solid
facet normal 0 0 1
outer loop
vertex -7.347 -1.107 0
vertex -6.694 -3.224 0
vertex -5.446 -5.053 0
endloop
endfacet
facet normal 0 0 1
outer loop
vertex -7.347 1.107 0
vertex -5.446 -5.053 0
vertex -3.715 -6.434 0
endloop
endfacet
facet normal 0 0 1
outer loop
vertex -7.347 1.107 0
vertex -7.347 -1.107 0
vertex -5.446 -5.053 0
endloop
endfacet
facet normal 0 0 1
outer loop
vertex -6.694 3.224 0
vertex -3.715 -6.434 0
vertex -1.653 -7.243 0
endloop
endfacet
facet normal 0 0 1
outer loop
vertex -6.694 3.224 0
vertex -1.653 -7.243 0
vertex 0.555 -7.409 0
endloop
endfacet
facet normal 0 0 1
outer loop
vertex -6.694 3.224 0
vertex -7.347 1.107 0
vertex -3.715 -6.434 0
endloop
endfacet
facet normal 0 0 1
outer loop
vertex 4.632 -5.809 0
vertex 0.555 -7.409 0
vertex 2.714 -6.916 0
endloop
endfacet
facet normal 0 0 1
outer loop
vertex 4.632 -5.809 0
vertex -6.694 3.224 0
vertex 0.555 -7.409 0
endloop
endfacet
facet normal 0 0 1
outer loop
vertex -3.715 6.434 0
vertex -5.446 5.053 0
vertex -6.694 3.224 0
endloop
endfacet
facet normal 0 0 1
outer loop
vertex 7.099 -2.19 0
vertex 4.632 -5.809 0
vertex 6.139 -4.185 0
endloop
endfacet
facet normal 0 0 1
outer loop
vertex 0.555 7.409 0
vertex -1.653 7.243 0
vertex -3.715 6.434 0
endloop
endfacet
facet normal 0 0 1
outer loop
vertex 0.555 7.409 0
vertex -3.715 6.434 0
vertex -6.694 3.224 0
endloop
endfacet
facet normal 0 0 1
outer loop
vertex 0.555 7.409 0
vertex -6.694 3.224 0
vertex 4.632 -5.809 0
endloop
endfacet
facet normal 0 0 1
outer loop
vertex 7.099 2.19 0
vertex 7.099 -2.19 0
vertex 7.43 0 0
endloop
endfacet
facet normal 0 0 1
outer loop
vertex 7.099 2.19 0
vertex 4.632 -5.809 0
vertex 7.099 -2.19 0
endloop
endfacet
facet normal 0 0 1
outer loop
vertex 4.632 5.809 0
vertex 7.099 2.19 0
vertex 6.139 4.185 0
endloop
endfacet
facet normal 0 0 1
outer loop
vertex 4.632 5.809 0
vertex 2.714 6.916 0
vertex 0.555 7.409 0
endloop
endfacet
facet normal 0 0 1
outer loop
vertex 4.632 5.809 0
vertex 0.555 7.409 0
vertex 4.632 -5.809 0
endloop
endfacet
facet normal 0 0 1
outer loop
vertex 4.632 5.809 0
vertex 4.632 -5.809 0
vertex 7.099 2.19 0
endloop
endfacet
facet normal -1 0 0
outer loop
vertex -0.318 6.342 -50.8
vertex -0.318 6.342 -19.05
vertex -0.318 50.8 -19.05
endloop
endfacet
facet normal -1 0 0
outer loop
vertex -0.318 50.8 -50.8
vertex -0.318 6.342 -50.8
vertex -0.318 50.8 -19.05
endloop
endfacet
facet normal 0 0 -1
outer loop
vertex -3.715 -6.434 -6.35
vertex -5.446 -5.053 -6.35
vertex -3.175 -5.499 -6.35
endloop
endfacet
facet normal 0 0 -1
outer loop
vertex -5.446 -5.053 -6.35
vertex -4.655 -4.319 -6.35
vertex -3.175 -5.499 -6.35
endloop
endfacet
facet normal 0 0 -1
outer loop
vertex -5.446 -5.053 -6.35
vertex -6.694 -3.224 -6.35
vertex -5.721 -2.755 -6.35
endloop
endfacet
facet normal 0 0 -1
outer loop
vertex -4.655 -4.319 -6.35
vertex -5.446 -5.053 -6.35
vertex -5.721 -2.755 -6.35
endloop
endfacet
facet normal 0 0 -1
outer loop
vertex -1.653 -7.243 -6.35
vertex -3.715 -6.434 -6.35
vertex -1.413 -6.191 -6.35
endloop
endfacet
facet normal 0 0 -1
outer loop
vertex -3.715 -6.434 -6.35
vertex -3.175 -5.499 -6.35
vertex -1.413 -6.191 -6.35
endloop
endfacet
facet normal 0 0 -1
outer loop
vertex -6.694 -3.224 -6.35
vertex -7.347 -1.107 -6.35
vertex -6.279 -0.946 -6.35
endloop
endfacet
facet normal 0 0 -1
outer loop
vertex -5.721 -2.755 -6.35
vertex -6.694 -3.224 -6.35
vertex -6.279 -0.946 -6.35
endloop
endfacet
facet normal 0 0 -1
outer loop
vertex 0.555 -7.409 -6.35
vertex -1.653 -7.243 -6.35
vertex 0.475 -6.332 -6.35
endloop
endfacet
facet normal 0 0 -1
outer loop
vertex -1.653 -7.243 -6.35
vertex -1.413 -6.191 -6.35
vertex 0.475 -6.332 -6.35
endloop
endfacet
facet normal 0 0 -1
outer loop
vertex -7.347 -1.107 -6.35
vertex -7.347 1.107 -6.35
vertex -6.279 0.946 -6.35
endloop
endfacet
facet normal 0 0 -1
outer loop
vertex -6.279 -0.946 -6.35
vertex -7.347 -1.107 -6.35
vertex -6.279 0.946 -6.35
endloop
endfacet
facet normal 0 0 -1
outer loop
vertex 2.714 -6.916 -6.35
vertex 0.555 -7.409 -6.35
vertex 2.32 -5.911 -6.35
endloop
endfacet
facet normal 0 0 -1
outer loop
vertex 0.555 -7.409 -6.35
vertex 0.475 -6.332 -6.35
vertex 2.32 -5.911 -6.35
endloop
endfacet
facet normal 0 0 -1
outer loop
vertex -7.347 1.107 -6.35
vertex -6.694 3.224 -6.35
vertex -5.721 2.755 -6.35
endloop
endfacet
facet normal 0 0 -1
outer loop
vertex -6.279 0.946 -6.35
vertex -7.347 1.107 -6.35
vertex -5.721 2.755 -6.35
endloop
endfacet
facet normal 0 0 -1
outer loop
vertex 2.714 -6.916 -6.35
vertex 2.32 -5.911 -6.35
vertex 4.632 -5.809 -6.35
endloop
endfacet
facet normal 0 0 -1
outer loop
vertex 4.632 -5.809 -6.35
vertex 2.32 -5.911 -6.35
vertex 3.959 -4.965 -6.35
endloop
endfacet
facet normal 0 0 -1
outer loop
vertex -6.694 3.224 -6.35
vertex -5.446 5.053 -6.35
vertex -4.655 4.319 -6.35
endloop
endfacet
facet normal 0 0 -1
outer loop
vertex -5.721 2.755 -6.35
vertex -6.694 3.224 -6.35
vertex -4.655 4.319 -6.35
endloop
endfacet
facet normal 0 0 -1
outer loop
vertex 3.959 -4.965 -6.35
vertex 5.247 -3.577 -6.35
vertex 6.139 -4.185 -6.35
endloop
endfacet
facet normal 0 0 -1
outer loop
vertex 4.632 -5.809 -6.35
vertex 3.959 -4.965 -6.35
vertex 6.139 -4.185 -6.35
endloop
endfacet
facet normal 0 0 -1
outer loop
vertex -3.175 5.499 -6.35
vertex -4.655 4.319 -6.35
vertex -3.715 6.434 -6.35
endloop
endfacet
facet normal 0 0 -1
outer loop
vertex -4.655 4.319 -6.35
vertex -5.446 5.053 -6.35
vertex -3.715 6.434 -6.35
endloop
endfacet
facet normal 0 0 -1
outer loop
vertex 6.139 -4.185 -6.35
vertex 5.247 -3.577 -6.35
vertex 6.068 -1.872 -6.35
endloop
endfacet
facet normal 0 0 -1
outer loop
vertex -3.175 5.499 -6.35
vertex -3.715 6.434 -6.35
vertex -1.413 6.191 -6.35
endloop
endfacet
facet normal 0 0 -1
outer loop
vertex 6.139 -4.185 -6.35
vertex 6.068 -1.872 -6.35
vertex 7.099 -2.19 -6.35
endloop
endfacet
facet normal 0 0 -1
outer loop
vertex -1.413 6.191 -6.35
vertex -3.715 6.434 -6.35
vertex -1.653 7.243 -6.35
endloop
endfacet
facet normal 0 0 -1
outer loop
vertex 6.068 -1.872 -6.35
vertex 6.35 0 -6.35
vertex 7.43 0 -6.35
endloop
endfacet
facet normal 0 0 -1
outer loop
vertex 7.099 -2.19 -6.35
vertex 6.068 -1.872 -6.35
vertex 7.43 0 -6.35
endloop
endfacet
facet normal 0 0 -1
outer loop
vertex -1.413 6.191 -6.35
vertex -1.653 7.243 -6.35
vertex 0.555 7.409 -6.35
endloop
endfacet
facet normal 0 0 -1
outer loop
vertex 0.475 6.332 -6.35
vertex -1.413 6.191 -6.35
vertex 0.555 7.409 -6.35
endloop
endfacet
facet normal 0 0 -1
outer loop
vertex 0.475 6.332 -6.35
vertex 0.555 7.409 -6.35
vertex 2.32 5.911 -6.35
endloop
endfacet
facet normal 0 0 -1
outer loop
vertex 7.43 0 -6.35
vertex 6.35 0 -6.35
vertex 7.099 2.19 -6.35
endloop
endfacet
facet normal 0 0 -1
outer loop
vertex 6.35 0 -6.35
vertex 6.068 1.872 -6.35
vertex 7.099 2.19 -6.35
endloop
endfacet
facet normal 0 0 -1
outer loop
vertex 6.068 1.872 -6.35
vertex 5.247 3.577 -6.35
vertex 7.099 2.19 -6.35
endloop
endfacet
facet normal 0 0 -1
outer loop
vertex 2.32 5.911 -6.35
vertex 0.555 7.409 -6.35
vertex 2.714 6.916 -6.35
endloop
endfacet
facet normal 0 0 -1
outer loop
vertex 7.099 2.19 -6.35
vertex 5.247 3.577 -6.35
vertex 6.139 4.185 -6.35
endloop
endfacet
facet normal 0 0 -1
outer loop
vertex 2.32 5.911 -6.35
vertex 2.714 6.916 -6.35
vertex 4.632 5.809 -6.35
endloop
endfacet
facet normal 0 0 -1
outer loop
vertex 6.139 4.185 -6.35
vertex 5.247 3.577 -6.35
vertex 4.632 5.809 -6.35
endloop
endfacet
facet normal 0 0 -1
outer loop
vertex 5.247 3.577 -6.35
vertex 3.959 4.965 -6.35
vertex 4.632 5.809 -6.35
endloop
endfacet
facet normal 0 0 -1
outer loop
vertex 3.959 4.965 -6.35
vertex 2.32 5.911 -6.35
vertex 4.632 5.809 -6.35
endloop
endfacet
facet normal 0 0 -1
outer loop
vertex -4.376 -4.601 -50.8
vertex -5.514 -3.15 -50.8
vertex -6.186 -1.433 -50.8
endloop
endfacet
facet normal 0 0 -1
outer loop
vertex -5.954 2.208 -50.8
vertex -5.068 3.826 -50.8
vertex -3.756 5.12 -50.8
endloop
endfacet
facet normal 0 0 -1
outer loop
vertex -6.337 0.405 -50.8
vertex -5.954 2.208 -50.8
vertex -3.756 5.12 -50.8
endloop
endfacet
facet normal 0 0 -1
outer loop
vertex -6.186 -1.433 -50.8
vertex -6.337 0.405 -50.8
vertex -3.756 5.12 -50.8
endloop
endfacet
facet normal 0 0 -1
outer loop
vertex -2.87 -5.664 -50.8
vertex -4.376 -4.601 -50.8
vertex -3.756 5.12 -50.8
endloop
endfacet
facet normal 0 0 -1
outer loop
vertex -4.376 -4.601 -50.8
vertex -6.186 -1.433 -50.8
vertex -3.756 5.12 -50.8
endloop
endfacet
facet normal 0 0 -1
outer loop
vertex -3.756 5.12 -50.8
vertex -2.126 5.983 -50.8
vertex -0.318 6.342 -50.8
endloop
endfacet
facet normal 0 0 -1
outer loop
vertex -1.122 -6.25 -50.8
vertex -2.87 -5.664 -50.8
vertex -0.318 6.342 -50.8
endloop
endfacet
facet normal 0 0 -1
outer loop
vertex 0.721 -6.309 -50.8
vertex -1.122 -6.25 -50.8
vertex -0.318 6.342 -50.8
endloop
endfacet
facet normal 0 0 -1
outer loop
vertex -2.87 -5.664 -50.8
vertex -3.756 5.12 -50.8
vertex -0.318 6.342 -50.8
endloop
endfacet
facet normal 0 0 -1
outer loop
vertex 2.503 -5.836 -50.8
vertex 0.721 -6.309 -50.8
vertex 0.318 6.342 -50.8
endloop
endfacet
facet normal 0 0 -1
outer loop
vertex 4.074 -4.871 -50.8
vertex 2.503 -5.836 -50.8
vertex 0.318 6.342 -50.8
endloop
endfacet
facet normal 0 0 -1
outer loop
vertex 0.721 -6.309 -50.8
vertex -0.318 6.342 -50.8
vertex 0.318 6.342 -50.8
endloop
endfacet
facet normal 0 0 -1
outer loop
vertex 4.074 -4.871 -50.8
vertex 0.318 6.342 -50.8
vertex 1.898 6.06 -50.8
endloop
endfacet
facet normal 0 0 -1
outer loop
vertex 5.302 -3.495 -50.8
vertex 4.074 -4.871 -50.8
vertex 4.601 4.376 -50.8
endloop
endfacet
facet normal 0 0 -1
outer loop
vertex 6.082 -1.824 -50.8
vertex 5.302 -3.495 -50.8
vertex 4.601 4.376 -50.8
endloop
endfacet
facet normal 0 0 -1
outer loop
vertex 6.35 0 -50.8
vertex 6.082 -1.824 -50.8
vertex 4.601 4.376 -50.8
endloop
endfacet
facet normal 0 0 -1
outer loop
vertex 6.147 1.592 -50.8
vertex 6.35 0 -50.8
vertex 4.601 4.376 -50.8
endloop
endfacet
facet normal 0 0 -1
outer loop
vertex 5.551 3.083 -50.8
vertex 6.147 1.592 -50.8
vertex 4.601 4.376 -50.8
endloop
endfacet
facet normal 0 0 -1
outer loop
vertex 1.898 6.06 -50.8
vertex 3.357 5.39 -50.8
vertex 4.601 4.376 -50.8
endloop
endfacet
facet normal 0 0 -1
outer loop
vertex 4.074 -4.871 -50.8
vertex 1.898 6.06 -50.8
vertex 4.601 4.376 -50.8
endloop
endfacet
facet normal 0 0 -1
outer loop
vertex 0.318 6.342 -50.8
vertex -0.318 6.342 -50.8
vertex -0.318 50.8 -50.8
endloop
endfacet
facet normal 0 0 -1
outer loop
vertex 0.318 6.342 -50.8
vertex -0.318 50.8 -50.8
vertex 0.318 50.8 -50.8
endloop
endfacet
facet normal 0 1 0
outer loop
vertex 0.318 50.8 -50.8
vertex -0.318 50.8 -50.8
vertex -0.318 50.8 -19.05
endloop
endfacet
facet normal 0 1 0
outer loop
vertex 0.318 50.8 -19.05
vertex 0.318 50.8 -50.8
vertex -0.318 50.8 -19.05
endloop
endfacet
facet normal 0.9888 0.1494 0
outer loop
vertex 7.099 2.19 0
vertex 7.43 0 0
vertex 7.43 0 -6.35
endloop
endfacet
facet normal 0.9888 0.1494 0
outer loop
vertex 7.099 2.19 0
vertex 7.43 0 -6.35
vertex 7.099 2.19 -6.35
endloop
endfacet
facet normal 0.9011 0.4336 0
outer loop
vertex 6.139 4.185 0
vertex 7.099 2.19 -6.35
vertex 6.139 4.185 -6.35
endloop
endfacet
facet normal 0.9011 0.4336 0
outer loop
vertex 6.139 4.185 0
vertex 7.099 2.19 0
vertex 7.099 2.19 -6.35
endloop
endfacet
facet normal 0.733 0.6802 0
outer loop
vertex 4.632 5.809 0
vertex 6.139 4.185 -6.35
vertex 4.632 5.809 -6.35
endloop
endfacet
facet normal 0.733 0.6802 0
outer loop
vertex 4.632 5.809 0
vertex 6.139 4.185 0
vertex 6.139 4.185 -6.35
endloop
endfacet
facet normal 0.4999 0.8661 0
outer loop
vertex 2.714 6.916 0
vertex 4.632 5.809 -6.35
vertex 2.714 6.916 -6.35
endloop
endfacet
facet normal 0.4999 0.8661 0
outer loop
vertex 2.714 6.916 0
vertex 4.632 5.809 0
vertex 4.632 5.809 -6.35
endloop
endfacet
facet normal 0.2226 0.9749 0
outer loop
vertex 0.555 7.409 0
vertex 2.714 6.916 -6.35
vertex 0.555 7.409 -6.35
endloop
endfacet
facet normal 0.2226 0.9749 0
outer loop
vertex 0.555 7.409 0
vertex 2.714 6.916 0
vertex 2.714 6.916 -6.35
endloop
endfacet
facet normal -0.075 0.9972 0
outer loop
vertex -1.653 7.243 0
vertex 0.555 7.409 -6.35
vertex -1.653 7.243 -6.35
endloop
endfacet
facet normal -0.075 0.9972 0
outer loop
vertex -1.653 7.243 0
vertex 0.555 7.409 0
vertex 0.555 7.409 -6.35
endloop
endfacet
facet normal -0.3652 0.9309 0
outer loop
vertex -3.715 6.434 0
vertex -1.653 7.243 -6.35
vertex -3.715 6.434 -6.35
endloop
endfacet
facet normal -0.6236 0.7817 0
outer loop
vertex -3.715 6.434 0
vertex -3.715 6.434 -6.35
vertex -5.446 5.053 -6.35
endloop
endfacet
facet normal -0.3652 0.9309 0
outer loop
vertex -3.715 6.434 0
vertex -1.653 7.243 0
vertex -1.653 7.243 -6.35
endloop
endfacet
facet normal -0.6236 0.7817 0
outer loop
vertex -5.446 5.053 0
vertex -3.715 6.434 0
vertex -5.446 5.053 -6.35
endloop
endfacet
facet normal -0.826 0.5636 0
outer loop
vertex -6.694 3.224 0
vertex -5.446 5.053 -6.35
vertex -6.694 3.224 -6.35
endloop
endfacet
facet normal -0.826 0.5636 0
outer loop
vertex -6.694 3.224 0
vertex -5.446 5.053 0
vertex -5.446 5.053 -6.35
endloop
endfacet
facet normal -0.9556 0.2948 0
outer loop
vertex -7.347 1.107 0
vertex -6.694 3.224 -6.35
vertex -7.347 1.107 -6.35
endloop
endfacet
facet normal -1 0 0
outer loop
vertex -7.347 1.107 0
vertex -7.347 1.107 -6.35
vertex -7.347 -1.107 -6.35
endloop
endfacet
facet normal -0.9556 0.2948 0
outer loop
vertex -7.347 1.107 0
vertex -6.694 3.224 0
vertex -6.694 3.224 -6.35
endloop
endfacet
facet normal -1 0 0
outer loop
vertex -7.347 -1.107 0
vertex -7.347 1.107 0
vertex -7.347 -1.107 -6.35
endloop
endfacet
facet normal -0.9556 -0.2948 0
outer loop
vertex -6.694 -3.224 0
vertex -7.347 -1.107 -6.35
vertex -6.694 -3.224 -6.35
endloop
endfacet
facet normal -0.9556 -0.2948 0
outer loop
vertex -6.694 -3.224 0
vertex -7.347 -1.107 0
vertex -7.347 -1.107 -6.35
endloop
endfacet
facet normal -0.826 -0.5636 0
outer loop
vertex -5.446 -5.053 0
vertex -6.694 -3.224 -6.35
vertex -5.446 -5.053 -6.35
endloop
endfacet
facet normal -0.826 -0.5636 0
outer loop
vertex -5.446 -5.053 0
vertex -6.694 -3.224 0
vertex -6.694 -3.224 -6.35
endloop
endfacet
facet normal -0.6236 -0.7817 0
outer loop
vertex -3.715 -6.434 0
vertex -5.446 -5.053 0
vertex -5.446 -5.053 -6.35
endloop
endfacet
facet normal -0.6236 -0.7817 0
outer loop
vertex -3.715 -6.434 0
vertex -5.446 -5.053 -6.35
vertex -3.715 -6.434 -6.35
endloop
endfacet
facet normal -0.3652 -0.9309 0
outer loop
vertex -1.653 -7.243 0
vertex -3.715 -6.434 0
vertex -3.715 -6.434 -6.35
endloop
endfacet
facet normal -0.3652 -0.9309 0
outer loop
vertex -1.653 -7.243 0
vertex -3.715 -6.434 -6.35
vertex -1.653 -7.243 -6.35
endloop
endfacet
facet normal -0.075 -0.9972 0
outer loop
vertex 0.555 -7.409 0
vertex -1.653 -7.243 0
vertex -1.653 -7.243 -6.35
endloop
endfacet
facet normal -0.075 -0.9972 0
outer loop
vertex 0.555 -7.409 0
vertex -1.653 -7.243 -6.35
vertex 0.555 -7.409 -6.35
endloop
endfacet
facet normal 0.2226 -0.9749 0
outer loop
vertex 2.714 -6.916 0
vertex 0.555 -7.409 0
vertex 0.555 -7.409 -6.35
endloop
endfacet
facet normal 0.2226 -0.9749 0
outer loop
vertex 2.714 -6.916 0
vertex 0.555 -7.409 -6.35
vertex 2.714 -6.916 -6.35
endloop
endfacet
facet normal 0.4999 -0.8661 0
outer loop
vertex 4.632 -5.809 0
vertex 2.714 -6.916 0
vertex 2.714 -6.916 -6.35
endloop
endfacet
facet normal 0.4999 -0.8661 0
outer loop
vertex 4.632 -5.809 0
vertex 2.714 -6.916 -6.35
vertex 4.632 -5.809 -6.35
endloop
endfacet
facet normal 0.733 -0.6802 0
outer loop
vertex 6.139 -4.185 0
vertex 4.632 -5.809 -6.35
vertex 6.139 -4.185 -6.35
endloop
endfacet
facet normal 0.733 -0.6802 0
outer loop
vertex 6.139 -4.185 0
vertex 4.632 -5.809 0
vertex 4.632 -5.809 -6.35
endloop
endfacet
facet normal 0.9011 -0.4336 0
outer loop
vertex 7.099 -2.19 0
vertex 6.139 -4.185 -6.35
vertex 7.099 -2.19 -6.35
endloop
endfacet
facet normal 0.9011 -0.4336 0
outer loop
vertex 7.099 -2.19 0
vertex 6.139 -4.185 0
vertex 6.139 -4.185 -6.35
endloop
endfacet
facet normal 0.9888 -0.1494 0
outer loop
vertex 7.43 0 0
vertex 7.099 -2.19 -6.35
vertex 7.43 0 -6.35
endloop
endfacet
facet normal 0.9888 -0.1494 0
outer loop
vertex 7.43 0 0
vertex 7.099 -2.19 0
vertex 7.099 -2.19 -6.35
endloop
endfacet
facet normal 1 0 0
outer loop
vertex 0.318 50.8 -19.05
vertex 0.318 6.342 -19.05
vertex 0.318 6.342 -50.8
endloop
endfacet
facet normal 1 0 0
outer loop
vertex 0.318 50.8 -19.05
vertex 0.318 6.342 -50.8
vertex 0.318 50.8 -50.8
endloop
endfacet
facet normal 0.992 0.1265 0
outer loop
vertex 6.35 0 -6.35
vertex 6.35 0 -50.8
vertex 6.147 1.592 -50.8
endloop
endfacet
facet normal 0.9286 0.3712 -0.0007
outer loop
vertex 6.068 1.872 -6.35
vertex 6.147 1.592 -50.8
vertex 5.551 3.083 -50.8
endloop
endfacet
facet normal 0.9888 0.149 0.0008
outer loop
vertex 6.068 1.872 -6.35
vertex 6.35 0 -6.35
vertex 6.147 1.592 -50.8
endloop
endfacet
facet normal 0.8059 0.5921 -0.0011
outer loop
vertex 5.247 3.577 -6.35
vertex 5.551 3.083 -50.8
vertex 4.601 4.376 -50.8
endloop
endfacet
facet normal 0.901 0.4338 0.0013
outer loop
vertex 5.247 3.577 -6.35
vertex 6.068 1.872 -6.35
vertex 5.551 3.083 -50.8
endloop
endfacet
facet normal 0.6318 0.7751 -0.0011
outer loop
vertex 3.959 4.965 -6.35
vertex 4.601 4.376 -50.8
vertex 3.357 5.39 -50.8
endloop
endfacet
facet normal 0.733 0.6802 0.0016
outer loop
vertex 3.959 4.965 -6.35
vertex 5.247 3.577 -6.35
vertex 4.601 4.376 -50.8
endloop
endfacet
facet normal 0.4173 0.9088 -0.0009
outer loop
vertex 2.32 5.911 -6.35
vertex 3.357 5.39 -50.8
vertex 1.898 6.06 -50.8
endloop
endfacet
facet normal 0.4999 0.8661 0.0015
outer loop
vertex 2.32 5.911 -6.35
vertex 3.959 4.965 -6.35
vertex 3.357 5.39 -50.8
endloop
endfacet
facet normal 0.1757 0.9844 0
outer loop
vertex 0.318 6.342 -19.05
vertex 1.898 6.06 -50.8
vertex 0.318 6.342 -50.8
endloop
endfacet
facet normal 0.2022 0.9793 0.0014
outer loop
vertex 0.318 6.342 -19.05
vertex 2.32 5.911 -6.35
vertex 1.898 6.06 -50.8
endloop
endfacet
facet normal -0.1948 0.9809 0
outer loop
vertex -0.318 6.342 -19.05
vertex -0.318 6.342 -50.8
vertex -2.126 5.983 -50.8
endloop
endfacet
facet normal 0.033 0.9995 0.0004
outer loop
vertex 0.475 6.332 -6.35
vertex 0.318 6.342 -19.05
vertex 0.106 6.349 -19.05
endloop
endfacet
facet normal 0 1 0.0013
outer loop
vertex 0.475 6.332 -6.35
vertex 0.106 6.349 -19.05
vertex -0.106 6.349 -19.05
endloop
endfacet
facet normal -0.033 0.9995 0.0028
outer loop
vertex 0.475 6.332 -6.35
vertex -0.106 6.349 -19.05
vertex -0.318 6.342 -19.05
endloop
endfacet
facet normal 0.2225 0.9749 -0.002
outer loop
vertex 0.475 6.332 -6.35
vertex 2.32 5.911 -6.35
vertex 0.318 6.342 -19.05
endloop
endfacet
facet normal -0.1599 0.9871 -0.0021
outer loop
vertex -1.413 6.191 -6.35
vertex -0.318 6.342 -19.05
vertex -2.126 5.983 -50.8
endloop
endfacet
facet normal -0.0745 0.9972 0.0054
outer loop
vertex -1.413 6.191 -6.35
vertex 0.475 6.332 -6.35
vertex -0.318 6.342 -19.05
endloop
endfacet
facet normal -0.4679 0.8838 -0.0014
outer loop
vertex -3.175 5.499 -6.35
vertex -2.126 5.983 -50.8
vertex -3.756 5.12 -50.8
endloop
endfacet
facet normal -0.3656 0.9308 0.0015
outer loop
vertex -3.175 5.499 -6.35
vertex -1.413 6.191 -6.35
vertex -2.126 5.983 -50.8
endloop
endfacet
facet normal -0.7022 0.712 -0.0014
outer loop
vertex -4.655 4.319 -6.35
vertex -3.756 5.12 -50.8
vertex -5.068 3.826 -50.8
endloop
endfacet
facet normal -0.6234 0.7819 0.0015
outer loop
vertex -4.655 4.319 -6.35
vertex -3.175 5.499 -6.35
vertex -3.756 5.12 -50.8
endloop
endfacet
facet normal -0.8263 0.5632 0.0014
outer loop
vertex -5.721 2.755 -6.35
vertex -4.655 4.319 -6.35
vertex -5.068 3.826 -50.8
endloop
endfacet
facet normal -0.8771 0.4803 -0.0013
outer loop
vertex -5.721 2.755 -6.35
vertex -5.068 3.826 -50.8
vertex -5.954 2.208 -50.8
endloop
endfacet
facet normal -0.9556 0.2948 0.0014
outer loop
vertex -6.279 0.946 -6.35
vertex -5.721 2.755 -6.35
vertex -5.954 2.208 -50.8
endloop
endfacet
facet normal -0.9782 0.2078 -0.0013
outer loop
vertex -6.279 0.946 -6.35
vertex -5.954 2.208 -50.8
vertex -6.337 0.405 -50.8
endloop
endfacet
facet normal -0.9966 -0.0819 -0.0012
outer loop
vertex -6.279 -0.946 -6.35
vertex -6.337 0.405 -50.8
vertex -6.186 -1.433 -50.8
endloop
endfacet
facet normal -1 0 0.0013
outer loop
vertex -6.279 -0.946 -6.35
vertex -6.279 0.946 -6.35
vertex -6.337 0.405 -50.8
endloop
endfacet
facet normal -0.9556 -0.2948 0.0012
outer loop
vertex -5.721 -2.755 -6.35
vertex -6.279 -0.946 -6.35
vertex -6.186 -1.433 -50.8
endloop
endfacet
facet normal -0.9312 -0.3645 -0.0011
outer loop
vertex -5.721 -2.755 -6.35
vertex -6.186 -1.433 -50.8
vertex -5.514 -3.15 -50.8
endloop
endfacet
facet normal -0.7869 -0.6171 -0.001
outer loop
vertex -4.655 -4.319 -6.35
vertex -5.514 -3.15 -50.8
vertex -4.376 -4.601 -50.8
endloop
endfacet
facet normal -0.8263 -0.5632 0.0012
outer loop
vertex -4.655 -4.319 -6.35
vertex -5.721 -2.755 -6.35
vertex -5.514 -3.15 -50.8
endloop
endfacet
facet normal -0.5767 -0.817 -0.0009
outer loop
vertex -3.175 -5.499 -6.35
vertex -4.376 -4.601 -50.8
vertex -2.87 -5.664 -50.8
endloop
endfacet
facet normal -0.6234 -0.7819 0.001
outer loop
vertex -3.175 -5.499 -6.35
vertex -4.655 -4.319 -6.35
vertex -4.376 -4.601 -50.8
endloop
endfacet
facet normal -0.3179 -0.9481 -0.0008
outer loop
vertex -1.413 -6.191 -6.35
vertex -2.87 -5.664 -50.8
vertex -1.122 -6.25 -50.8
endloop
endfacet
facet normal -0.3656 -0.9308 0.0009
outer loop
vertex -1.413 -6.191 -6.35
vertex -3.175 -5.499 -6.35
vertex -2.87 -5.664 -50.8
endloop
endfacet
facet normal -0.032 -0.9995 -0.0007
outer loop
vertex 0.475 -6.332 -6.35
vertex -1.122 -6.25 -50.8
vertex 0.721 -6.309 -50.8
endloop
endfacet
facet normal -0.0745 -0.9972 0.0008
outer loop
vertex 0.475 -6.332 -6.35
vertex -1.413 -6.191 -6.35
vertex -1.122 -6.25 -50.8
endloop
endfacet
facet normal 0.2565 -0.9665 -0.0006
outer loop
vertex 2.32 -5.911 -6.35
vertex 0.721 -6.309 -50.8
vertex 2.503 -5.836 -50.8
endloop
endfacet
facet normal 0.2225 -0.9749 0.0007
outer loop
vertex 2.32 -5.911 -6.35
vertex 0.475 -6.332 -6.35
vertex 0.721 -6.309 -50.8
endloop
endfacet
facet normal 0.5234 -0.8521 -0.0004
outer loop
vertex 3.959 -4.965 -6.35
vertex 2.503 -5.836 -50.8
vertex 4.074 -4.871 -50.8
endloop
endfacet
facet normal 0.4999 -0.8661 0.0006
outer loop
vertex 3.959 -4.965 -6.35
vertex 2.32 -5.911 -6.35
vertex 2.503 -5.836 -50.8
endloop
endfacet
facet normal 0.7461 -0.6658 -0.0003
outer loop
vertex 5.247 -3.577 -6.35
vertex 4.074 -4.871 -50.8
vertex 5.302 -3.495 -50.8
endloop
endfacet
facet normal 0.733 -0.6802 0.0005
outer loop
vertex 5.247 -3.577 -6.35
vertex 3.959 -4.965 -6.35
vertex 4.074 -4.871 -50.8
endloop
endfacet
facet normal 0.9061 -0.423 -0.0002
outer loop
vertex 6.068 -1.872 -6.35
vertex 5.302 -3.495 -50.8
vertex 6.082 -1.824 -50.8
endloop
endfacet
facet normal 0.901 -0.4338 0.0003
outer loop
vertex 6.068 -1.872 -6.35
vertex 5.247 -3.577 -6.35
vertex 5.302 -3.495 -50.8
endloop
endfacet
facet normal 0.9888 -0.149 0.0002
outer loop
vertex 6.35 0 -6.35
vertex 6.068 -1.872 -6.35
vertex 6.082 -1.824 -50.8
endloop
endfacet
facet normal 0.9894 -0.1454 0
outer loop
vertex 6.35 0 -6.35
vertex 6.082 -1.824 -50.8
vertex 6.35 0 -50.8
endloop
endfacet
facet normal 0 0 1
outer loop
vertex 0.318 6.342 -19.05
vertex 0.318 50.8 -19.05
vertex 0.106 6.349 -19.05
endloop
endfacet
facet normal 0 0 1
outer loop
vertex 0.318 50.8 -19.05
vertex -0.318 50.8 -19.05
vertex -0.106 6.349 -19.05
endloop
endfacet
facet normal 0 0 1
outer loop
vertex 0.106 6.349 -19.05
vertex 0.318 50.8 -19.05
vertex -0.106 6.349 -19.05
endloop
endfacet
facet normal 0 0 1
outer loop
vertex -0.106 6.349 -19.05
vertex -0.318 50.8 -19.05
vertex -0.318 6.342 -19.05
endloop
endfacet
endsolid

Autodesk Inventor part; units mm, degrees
ref_plane "YZ Plane" through (0, 0, 0) normal (1, 0, 0) x (0, 1, 0)
ref_plane "XZ Plane" through (0, 0, 0) normal (0, 1, 0) x (-1, 0, 0)
ref_plane "XY Plane" through (0, 0, 0) normal (0, 0, 1) x (1, 0, 0)
sketch "Sketch1" plane through (0, 0, 0) normal (0, 0, 1) x (1, 0, 0)
  circle A0 centre (0, 0) radius 6.35
  dimension "d0" = 12.7
extrude "Extrusion1" add sketch "Sketch1" against normal blind 50.8
sketch "Sketch2" plane through (0, 0, 0) normal (0, 0, 1) x (1, 0, 0)
  circle A0 centre (0, 0) radius 7.4295
  dimension "d3" = 14.859
extrude "Extrusion3" add sketch "Sketch2" against normal blind 6.35
sketch "Sketch3" plane through (0, 0, 0) normal (1, 0, 0) x (0, 1, 0)
  line L0 (-6.35, -50.8) -> (6.35, -50.8) projected
  line L1 (0, -50.8) -> (50.8, -50.8)
  line L2 (50.8, -50.8) -> (50.8, -19.05)
  line L3 (50.8, -19.05) -> (0, -19.05)
  line L4 (0, -19.05) -> (0, -50.8)
  line L5 (7.4295, 0) -> (-7.4295, 0) projected
  point P0 (0, 0)
  dimension "d8" = 19.05
  dimension "d9" = 50.8
extrude "Extrusion4" add sketch "Sketch3" along normal mid plane 0.635
properties part number "portionOfShade" material "PC/ABS Plastic"
